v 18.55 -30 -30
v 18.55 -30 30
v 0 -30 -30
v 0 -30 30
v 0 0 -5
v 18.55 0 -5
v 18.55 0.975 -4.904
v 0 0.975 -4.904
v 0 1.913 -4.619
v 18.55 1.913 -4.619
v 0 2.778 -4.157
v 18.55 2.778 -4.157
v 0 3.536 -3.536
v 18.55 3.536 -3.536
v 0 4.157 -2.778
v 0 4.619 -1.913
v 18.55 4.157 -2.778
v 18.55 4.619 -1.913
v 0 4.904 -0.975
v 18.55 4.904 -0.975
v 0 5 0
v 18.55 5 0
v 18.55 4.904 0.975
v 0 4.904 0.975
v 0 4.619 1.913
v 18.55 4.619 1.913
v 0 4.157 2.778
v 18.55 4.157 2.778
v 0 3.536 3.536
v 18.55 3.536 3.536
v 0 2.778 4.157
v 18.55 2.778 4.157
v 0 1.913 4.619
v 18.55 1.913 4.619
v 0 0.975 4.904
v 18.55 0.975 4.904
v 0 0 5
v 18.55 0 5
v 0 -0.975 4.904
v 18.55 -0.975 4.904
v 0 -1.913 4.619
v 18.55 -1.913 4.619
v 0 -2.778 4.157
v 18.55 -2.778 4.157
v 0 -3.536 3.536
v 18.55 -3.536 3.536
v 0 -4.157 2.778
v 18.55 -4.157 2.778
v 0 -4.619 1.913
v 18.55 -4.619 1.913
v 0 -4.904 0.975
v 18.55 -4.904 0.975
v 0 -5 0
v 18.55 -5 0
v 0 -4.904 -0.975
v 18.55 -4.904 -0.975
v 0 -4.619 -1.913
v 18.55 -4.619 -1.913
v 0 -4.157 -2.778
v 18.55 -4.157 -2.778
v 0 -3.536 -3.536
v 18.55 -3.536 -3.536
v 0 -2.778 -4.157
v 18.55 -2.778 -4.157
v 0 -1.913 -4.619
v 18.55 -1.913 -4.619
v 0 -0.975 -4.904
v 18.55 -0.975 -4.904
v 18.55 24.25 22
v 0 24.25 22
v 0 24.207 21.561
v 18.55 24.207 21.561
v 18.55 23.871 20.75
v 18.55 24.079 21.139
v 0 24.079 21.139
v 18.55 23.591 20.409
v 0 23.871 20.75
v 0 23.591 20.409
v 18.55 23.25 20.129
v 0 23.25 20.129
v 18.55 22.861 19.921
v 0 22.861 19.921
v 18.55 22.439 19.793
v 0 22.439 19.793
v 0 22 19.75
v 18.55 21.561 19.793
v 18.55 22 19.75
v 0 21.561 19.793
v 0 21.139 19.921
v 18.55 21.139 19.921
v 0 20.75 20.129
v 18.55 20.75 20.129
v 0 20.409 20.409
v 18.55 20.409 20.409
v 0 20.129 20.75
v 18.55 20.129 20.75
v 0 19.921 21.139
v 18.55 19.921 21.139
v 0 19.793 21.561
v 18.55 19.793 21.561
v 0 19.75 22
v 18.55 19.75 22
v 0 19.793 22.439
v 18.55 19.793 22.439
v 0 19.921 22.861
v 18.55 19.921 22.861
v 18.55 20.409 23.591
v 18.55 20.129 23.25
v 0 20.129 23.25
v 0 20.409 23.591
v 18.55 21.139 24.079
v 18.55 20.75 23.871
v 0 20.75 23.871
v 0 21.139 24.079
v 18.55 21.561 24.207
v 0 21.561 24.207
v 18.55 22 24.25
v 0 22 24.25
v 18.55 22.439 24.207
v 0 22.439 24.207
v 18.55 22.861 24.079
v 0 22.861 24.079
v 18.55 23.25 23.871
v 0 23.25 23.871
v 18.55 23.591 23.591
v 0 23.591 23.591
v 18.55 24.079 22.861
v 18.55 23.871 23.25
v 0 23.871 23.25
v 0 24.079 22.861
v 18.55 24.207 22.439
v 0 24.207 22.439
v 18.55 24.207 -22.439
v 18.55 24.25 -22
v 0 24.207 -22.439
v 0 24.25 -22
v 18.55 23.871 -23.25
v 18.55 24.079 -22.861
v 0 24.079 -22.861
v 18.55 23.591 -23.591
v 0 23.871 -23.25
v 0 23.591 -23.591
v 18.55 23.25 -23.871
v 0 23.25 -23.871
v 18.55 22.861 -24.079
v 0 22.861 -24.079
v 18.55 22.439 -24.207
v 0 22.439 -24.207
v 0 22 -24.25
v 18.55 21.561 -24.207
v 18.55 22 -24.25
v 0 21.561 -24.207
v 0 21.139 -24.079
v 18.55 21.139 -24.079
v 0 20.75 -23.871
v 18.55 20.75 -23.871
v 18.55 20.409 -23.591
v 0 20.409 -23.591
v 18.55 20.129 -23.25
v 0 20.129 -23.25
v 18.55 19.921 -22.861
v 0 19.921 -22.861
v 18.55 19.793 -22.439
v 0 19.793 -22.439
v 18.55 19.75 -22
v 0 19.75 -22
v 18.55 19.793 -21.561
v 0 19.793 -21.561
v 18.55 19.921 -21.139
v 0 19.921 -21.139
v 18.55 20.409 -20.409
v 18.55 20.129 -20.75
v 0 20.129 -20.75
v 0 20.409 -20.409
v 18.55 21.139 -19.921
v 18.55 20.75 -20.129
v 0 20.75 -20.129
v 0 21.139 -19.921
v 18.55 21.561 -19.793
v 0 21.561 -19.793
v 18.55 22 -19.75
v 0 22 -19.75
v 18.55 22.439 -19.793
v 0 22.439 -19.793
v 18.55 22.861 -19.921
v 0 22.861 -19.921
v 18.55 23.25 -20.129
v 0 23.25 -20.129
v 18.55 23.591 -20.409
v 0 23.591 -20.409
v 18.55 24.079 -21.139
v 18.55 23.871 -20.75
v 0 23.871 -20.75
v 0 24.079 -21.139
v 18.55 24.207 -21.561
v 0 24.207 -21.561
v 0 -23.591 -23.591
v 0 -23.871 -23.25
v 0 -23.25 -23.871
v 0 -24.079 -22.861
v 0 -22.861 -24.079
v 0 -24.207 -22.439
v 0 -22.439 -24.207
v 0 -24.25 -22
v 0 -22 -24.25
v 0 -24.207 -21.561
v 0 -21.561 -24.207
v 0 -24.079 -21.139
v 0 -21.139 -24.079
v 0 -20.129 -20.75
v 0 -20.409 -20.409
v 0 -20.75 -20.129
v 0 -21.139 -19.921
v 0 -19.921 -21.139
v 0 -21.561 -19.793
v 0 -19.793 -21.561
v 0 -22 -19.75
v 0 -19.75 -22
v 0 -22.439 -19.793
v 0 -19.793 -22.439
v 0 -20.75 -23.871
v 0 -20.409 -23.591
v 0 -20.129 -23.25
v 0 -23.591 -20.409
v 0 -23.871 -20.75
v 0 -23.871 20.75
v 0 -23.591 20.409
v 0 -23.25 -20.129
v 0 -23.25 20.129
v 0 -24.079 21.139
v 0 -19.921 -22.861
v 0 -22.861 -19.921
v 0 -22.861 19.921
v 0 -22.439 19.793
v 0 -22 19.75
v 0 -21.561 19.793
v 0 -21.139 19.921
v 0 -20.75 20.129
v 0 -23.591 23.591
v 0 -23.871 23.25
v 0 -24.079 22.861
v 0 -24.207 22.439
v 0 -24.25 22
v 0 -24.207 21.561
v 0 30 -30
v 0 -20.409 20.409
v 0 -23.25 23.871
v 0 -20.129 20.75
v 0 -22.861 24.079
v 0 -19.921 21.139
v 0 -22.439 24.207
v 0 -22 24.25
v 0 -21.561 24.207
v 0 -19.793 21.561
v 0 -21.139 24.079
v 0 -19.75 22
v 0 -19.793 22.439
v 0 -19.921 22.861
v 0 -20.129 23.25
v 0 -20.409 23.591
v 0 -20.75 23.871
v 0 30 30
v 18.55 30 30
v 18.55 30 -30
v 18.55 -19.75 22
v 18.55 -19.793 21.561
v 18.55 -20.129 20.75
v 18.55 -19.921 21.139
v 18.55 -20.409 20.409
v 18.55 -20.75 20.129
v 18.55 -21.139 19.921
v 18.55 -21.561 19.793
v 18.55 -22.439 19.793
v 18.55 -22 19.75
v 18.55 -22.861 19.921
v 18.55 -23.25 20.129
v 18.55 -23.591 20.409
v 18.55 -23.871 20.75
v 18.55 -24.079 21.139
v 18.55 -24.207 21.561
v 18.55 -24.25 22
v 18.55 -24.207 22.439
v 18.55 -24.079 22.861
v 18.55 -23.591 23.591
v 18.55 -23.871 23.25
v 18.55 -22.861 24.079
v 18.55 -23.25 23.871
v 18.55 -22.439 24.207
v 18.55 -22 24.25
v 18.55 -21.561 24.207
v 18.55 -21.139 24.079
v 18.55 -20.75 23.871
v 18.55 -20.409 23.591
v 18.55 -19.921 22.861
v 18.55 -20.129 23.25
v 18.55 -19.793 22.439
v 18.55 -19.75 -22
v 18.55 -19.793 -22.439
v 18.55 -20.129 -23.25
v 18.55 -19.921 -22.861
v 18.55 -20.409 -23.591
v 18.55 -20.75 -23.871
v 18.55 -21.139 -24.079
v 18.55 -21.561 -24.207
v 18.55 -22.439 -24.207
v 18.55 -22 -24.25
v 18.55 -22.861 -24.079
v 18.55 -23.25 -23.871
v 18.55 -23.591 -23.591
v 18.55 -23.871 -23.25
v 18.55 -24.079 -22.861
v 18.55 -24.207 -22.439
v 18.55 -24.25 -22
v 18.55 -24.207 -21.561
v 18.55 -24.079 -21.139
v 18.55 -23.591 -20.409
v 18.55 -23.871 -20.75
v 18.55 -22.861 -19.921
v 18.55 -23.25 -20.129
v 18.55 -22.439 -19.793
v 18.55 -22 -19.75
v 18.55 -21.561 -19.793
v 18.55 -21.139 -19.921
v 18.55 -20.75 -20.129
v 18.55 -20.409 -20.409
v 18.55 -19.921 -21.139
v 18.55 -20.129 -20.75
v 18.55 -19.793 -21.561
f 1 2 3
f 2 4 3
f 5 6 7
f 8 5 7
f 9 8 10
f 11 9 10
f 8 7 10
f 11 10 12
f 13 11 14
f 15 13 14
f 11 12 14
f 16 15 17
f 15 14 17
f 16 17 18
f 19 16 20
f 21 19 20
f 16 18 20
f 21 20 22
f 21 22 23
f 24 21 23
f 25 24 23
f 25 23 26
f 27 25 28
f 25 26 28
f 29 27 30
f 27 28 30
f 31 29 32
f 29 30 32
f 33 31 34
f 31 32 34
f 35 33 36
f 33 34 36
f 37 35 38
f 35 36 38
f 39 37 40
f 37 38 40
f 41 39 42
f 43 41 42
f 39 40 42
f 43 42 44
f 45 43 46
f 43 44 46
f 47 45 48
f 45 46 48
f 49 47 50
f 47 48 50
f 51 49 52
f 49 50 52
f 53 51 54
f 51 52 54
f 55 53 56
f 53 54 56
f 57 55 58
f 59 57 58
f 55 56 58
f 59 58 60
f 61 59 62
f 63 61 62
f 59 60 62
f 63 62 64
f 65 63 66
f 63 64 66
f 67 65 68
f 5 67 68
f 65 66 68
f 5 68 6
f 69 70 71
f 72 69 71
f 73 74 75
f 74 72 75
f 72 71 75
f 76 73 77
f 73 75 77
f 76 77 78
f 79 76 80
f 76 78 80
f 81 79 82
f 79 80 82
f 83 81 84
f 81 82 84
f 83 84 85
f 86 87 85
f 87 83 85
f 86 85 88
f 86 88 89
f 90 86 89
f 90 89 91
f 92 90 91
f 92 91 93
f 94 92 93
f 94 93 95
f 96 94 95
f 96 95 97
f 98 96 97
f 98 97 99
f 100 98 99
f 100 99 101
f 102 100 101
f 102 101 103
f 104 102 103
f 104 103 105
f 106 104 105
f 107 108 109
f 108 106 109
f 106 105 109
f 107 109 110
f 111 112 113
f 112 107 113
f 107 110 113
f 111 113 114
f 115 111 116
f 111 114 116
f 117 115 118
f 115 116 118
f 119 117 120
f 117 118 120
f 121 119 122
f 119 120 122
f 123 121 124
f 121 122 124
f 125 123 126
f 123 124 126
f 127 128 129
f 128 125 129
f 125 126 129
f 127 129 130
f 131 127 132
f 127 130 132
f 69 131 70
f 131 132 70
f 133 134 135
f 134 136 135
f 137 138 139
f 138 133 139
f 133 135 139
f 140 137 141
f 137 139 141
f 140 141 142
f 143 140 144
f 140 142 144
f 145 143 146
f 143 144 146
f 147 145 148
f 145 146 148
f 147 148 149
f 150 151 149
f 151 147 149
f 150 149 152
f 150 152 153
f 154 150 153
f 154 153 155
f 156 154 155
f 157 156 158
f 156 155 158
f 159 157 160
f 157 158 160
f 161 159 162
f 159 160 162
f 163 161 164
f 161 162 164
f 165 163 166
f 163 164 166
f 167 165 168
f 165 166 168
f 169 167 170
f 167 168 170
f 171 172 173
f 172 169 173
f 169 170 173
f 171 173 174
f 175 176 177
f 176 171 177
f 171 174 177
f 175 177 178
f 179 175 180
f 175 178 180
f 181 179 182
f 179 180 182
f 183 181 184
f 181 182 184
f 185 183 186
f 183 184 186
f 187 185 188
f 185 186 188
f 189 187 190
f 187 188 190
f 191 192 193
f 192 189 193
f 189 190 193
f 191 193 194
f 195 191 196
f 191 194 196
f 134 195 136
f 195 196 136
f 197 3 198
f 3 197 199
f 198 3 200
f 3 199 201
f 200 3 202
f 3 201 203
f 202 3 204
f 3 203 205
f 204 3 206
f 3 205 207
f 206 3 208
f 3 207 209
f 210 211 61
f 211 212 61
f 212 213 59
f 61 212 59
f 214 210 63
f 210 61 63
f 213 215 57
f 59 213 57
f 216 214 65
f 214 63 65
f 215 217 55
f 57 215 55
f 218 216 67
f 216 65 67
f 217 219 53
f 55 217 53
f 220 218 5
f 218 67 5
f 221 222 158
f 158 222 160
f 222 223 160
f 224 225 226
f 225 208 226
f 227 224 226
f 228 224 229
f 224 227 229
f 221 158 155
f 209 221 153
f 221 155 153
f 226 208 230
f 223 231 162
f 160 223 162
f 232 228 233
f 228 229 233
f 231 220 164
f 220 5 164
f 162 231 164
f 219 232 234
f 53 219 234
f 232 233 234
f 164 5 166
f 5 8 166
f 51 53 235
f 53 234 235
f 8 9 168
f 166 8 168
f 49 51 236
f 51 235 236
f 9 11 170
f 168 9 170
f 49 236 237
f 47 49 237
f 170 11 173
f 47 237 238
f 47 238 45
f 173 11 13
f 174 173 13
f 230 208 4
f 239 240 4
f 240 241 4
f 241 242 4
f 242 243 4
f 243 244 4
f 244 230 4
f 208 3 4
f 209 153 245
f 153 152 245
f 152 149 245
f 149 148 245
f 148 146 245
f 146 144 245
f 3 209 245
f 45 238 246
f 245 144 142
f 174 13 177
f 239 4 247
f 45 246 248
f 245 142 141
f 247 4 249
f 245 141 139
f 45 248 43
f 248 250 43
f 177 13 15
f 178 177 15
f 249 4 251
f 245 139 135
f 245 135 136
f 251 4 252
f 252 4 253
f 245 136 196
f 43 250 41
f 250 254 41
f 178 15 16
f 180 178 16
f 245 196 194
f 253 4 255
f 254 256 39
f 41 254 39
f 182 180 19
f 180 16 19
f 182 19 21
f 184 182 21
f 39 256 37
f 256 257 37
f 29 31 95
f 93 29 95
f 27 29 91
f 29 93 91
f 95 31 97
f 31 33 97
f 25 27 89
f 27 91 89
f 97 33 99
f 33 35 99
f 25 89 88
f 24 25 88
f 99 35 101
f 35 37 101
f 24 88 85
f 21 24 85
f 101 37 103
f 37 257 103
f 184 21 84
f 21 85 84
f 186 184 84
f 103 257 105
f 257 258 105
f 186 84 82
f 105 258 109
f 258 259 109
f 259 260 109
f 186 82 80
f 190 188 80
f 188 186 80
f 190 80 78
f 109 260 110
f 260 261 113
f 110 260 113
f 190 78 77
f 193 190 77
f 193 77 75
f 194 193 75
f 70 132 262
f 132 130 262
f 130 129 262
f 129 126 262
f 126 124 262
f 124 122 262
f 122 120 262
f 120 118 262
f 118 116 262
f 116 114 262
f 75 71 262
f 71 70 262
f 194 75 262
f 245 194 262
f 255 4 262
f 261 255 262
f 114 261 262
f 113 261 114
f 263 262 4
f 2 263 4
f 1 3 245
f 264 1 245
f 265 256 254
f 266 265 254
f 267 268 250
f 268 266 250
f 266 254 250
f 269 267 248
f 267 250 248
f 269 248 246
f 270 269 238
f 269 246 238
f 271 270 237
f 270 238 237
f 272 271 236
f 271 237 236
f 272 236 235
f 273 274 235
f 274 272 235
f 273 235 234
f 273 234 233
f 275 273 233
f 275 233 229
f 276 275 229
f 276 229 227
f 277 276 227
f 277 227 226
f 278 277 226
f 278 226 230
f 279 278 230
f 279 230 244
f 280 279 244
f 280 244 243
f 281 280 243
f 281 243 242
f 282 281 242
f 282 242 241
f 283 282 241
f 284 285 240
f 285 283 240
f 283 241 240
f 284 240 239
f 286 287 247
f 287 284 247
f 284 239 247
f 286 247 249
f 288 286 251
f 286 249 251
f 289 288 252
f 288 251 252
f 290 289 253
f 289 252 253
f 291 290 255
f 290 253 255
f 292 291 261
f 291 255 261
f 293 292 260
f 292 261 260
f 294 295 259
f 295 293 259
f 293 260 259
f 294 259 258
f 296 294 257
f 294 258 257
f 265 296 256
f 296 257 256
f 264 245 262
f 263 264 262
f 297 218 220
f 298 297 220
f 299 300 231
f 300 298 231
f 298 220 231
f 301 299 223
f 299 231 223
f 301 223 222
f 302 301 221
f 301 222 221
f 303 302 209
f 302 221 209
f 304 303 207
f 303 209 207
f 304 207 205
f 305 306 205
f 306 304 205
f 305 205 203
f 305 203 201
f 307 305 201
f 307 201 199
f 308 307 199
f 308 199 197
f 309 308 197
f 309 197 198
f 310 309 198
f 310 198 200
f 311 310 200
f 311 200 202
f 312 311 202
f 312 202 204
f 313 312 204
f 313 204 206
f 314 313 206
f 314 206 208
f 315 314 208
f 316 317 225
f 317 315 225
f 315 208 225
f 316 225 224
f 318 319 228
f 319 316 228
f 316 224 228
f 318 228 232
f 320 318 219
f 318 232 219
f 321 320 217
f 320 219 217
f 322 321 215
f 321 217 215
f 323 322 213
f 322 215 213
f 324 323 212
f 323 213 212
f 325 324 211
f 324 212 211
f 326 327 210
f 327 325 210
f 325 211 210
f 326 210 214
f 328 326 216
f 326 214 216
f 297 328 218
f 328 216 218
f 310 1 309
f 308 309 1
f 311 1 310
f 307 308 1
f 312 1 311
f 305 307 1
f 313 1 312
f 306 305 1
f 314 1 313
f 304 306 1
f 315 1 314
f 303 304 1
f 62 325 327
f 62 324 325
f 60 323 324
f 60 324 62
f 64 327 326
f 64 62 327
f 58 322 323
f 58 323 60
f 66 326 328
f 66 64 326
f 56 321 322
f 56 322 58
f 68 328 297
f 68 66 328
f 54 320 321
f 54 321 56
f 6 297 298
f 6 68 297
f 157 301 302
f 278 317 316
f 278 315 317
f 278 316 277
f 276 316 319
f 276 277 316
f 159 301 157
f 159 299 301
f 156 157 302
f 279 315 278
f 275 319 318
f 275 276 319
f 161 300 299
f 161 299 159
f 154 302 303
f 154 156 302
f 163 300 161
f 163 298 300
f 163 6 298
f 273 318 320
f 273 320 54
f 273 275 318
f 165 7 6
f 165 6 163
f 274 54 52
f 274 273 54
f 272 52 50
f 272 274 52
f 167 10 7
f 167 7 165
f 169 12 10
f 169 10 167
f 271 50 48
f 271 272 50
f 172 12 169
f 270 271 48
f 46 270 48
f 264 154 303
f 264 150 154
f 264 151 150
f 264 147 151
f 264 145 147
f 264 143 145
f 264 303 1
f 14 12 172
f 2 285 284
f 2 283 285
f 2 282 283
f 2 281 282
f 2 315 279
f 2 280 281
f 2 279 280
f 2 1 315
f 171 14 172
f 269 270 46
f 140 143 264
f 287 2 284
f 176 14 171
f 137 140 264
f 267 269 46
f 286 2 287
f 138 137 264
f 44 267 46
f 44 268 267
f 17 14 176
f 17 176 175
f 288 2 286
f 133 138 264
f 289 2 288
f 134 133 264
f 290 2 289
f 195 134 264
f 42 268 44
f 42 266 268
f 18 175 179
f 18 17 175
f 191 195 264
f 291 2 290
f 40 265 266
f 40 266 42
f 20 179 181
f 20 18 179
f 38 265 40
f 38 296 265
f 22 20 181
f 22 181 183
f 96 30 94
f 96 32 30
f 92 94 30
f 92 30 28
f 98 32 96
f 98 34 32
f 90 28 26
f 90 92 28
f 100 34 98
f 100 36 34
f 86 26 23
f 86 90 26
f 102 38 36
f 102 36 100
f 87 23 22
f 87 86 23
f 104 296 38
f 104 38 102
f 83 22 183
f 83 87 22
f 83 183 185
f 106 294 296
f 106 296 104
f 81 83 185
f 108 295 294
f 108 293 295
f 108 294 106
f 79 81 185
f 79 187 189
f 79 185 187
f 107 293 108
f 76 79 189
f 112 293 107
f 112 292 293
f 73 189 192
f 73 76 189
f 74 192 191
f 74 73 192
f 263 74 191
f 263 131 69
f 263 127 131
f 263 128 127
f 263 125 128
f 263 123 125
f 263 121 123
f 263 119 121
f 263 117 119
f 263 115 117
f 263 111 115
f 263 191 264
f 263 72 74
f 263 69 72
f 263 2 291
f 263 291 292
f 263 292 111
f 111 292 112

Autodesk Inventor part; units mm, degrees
ref_plane "YZ Plane" through (0, 0, 0) normal (1, 0, 0) x (0, 1, 0)
ref_plane "XZ Plane" through (0, 0, 0) normal (0, 1, 0) x (-1, 0, 0)
ref_plane "XY Plane" through (0, 0, 0) normal (0, 0, 1) x (1, 0, 0)
sketch "Esquisse1" plane through (0, 0, 0) normal (1, 0, 0) x (0, 1, 0)
  line L0 (-30, -30) -> (30, -30)
  line L1 (30, -30) -> (30, 30)
  line L2 (30, 30) -> (-30, 30)
  line L3 (-30, 30) -> (-30, -30)
  line L4 (-30, -30) -> (30, 30) construction
  line L5 (30, -30) -> (-30, 30) construction
  circle A0 centre (22, 22) radius 2.25
  circle A1 centre (-22, 22) radius 2.25
  circle A2 centre (22, -22) radius 2.25
  circle A3 centre (-22, -22) radius 2.25
  point P0 (0, 0)
  dimension "d0" = 60
  dimension "d1" = 8
  dimension "d2" = 4.5
extrude "Extrusion1" add sketch "Esquisse1" along normal blind 18.55
sketch "Esquisse2" plane through (18.55, 0, 0) normal (1, 0, 0) x (0, 0, -1)
  circle A0 centre (0, 0) radius 5
  dimension "d5" = 10
extrude "Extrusion2" cut sketch "Esquisse2" against normal blind 18.55
properties part number "nut_blocker"
